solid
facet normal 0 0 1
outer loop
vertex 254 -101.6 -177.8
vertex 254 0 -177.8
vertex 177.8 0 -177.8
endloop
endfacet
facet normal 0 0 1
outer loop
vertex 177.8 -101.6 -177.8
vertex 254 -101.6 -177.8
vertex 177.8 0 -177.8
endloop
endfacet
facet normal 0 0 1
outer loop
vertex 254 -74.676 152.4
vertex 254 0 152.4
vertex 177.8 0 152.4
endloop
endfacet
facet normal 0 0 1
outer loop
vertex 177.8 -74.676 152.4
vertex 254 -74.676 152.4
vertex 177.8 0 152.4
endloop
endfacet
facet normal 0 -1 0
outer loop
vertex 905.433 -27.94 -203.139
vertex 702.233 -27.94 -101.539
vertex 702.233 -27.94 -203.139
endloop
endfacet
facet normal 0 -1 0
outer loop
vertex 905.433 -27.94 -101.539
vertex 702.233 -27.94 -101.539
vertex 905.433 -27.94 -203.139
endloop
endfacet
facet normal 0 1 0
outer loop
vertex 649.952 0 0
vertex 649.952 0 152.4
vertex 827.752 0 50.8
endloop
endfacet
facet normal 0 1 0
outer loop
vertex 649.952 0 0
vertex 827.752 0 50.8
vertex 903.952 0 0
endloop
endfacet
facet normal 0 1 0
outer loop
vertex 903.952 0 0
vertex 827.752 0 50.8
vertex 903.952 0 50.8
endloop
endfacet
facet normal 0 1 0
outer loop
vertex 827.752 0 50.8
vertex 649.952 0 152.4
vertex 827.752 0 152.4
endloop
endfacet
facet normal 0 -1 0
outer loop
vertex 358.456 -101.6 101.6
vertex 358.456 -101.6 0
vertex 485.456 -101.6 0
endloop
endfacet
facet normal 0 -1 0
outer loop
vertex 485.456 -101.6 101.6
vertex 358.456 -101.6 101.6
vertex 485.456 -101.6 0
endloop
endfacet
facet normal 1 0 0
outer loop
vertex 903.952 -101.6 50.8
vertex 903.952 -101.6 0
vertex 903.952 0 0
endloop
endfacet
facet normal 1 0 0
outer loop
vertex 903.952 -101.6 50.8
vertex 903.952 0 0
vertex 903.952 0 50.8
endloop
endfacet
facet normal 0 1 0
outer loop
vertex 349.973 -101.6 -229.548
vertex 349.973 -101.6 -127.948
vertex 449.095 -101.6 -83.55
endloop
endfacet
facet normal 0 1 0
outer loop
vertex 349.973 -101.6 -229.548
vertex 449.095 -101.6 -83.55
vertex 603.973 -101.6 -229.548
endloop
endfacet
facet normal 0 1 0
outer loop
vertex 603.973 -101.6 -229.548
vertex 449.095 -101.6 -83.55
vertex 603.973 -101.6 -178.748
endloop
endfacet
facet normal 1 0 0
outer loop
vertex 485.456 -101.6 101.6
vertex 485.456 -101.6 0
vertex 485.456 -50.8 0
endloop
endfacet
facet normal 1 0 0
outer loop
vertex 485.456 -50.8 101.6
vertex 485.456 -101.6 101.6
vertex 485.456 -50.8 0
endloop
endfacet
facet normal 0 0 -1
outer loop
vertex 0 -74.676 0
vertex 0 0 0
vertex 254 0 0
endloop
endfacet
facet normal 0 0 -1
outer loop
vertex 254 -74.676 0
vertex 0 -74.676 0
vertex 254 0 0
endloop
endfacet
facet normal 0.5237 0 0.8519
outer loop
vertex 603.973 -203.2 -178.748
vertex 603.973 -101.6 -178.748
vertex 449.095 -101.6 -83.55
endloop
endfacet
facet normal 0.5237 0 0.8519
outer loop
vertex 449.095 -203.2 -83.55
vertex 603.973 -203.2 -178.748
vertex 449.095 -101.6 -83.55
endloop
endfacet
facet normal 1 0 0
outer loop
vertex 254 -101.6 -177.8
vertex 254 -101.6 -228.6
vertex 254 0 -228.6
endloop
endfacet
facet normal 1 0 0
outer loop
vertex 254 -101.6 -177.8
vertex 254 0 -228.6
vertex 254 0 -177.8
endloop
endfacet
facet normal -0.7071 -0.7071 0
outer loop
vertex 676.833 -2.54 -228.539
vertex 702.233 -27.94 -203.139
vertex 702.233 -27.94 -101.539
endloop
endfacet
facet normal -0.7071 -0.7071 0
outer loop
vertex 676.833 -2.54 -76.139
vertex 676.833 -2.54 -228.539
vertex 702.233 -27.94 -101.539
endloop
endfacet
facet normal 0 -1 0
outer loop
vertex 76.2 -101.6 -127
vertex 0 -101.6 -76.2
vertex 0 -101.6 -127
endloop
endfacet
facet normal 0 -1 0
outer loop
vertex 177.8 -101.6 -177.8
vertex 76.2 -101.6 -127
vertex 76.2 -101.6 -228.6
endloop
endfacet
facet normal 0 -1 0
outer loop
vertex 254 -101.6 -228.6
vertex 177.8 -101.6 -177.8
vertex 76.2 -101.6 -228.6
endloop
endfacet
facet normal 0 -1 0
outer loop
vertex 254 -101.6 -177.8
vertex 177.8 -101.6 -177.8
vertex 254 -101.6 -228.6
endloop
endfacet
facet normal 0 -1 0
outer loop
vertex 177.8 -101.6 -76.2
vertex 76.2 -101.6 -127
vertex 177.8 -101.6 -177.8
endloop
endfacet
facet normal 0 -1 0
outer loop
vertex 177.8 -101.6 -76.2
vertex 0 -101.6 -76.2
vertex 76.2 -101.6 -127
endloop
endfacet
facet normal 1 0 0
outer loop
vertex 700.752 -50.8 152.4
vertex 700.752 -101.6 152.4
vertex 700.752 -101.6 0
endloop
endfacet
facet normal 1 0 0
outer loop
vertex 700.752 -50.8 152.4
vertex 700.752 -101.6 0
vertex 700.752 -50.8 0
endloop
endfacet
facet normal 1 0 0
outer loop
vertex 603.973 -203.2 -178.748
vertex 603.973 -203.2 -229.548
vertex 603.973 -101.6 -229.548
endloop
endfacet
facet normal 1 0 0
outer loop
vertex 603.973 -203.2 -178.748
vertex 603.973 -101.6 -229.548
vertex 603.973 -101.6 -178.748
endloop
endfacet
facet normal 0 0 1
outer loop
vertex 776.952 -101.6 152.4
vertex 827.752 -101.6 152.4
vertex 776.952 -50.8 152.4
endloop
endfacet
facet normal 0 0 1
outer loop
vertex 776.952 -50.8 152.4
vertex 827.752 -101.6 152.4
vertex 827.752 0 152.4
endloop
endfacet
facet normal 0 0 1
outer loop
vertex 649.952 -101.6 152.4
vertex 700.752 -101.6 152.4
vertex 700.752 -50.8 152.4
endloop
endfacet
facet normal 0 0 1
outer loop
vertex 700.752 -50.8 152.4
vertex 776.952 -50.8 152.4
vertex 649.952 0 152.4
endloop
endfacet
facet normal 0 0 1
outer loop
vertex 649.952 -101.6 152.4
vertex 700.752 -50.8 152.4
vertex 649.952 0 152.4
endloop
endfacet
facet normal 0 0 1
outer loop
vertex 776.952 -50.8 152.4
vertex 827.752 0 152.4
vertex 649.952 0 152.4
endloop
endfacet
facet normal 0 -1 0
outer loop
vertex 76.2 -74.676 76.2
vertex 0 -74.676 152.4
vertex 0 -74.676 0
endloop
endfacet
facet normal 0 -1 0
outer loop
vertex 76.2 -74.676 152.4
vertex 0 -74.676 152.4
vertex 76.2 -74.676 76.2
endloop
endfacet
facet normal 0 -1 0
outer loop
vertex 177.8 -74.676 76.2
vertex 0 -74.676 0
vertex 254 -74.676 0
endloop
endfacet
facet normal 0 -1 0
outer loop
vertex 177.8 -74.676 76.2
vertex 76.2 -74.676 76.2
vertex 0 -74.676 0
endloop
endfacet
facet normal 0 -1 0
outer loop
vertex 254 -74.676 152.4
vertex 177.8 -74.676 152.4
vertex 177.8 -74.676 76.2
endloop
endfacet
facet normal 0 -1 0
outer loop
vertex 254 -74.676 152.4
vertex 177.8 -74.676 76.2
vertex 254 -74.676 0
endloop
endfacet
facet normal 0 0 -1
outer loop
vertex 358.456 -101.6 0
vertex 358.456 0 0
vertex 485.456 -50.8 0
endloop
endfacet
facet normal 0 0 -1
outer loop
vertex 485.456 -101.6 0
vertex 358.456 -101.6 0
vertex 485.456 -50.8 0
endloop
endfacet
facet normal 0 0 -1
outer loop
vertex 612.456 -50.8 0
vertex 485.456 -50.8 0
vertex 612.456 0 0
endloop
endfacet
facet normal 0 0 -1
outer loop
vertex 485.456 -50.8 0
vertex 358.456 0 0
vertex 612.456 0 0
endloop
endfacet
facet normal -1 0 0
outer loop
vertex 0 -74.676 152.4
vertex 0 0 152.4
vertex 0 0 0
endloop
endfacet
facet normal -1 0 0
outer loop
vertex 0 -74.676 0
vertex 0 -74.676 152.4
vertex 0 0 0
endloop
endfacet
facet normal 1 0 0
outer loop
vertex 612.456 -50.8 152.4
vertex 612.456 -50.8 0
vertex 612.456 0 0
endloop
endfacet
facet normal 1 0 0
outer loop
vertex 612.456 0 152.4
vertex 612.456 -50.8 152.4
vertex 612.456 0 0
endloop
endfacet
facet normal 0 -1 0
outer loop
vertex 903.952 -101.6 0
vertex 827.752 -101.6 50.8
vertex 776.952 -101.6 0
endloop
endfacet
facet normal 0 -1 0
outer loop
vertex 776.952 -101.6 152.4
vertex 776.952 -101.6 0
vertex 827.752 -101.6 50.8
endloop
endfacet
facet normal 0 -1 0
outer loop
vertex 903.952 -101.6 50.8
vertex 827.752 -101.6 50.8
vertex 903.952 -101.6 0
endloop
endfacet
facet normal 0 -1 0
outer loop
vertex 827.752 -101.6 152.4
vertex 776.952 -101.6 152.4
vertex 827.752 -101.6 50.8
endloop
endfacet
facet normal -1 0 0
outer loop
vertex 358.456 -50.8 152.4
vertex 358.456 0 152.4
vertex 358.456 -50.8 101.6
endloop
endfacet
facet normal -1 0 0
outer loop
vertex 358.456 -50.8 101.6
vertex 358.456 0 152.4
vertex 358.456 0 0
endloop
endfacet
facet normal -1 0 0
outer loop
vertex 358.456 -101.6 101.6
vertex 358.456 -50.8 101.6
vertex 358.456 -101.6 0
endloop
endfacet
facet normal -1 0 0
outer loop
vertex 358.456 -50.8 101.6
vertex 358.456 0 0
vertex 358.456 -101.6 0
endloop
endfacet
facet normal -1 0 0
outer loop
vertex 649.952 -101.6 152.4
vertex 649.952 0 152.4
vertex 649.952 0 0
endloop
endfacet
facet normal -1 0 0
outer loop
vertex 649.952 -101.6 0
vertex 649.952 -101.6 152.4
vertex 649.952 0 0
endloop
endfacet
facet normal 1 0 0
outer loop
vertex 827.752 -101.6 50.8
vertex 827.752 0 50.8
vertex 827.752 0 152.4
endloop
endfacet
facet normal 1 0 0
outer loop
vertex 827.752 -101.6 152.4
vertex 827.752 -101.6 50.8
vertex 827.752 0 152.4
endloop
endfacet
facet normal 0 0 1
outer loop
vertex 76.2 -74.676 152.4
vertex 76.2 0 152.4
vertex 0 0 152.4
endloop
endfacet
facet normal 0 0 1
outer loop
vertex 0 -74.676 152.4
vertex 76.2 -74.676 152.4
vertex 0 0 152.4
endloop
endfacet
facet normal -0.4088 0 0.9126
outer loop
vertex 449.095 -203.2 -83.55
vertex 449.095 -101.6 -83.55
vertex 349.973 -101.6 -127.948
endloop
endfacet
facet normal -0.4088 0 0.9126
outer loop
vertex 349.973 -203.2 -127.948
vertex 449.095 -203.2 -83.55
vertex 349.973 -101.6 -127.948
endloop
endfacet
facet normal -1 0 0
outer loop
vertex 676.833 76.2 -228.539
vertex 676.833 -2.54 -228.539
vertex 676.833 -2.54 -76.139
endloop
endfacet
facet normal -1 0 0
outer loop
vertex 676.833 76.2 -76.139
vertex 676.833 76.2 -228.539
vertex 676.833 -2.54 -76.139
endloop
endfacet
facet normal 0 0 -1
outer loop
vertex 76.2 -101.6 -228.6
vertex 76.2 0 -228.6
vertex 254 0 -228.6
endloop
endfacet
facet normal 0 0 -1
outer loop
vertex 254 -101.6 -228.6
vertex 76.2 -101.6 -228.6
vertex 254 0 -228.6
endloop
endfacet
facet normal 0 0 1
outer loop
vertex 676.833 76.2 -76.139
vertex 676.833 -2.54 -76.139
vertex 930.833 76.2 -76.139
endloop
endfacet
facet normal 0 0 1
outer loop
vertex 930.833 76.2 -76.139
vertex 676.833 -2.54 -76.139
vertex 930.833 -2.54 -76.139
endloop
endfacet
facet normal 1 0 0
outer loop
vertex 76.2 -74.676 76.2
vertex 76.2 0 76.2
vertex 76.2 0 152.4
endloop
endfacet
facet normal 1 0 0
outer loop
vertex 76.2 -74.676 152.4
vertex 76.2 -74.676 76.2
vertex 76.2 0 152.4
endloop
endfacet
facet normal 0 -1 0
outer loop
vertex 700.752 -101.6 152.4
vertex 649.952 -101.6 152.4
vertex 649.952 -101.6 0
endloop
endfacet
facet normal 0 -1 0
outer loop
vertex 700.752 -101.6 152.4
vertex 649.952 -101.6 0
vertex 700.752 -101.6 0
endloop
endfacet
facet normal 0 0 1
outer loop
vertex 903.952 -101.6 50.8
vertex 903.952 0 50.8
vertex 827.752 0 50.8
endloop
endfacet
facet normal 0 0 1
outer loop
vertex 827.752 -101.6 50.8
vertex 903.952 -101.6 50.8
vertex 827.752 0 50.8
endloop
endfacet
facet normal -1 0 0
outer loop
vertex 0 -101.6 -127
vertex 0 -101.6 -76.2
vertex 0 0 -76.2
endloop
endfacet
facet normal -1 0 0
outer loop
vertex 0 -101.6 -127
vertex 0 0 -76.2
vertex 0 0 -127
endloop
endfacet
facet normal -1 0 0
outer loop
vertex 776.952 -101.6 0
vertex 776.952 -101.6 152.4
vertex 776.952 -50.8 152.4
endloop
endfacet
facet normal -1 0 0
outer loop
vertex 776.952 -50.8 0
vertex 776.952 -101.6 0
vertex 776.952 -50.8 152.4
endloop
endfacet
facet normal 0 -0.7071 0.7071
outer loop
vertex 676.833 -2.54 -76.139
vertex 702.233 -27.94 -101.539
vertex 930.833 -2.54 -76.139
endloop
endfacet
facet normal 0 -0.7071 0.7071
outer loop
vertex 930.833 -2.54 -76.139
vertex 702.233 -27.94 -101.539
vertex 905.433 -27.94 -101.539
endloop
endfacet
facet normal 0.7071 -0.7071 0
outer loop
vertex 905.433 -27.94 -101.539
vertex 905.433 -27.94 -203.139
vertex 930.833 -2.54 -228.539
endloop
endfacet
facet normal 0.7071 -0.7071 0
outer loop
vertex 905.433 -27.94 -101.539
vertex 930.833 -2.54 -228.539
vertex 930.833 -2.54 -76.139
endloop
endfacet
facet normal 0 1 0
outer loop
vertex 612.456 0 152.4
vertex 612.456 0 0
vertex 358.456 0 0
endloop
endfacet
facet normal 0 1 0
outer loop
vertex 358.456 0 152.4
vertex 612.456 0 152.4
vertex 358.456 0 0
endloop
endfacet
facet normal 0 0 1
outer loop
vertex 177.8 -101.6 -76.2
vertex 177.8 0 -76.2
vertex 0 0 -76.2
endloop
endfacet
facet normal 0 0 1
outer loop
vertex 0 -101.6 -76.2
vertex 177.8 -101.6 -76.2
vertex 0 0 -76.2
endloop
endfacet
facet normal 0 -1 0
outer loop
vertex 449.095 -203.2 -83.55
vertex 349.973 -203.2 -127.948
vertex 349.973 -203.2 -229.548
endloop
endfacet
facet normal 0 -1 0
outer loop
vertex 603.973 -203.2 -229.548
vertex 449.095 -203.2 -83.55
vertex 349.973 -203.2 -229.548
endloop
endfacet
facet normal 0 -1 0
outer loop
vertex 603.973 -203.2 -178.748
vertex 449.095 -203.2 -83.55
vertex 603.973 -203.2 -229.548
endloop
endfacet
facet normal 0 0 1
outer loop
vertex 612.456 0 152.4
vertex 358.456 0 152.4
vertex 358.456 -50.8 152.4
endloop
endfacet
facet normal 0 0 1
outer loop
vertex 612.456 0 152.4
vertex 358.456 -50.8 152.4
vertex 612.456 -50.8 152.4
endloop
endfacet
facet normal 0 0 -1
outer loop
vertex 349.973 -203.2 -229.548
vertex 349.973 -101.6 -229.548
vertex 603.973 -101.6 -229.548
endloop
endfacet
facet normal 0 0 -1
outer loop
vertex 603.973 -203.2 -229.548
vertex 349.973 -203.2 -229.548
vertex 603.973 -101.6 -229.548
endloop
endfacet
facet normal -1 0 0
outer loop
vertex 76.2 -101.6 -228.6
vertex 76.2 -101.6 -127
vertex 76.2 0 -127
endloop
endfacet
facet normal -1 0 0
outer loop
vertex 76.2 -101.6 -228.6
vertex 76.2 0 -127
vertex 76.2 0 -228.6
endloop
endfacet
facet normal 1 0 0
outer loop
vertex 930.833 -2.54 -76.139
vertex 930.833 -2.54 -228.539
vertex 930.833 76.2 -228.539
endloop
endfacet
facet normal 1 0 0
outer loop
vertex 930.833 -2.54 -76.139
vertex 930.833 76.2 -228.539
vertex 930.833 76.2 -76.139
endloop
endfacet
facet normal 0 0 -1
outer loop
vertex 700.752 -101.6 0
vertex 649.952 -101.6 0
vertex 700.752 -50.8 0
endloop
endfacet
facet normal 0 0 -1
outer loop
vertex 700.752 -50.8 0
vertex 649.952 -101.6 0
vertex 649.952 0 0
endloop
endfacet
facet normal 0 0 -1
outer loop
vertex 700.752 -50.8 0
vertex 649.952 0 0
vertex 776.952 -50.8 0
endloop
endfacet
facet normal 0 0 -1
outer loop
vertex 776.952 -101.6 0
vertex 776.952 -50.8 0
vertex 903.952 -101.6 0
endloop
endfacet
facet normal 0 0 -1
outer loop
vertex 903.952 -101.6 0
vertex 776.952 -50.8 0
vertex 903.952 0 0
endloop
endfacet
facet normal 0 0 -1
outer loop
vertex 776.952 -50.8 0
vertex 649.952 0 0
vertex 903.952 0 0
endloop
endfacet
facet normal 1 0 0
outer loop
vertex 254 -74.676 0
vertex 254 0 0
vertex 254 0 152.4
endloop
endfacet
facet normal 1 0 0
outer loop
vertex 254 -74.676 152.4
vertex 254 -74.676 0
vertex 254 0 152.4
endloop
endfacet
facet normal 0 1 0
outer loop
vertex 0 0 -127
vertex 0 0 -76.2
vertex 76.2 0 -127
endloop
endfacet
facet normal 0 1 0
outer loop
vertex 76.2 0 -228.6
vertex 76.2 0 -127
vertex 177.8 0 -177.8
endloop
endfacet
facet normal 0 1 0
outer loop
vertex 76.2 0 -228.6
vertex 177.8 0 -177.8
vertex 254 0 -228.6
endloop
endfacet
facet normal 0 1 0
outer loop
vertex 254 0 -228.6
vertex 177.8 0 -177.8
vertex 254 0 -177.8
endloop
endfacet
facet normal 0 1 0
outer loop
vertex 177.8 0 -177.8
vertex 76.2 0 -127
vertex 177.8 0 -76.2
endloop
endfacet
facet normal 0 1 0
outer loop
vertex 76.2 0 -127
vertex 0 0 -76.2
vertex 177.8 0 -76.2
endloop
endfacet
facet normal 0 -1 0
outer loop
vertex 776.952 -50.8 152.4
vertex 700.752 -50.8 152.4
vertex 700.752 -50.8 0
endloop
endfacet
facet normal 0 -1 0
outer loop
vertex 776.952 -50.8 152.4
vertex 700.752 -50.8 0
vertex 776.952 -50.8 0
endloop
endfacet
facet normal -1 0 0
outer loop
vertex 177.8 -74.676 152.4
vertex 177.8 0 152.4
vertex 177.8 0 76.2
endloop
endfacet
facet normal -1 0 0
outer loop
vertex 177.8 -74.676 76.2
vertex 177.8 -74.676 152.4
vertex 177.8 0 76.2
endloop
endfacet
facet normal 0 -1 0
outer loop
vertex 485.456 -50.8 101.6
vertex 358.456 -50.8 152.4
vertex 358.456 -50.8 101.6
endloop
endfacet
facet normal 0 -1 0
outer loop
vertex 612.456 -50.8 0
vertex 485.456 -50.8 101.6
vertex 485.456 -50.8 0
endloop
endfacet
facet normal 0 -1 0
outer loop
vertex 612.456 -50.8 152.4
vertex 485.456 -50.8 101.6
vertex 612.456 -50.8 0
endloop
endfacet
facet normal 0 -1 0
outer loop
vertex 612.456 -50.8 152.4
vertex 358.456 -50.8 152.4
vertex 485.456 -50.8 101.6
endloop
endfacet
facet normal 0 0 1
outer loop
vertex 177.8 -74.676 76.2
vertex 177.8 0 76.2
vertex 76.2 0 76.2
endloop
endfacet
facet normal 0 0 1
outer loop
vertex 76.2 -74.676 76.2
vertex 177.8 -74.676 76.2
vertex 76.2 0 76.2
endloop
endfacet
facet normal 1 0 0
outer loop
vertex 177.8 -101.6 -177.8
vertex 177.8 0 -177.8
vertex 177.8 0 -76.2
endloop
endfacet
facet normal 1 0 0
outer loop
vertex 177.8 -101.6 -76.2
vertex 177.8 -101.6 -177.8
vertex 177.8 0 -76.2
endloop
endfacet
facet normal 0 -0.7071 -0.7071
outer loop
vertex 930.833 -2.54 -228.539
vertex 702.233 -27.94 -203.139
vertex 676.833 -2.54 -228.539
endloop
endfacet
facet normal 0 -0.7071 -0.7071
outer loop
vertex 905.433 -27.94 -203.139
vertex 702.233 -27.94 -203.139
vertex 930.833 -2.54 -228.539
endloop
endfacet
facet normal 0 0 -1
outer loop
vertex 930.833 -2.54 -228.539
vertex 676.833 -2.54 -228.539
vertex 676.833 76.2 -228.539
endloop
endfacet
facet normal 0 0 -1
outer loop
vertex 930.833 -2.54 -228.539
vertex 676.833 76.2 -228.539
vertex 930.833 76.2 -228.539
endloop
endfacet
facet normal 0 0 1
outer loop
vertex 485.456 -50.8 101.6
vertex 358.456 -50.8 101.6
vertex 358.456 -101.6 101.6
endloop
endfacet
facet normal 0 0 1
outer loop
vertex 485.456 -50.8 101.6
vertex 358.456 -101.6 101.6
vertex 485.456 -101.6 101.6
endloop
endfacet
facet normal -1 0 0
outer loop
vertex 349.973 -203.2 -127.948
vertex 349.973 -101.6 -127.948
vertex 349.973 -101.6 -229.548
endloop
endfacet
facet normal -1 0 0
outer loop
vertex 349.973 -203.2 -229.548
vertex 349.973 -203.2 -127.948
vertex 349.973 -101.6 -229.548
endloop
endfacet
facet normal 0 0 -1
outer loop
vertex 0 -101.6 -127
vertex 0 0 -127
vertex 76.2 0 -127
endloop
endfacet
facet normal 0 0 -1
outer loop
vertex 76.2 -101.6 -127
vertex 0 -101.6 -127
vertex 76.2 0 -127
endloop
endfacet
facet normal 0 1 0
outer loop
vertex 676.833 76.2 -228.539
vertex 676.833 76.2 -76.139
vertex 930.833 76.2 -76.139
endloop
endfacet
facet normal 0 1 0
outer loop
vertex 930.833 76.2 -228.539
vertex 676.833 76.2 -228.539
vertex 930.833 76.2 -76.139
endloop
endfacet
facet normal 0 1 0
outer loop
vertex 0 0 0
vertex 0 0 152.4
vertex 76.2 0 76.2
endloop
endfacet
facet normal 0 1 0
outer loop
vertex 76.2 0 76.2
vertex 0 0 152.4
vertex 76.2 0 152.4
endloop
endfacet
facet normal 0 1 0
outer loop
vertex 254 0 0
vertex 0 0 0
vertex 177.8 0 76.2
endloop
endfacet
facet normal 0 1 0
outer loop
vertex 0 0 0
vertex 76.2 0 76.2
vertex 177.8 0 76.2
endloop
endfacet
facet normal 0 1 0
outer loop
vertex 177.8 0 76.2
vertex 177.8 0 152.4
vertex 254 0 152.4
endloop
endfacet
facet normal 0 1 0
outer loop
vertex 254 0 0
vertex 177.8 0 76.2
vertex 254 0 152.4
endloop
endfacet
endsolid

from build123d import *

# Parameters (mm, degrees)
F1_DEPTH  = 74.676
F4_DEPTH  = 101.6
F5_W      = 76.2
F5_H      = 50.8
F6_DEPTH  = 152.4
F7_DEPTH  = 152.4
F8_W      = 127
F8_H      = 50.8
F9_DEPTH  = 50.8
F10_W     = 254
F10_H     = 101.6
F11_DEPTH = 152.4
F12_W     = 76.2
F12_H     = 101.6
F13_DEPTH = 101.6
F14_W     = 76.2
F14_H     = 101.6
F15_DEPTH = 101.6
F18_DEPTH = 101.6
F20_DEPTH = 101.6
F21_W     = 254
F21_H     = 152.4
F22_DEPTH = 27.94
F23_SIZE  = 25.4
F24_DEPTH = 76.2


with BuildPart() as f1:
    # F0 (on Front) → F1 (new body)
    with BuildSketch(Plane.XZ):
        Polygon((0, 152.4), (0, 0), (254, 0), (254, 152.4), (177.8, 152.4), (177.8, 76.2), (76.2, 76.2), (76.2, 152.4), align=None)
    extrude(amount=F1_DEPTH)


with BuildPart() as f4:
    # F3 (on Front) → F4 (new body)
    with BuildSketch(Plane.XZ):
        Polygon((649.95204, 152.4), (649.95204, 0), (903.95204, 0), (903.95204, 50.8), (827.75204, 50.8), (827.75204, 152.4), align=None)
    extrude(amount=F4_DEPTH)

    # F5 (on face) → F6 (cut)
    with BuildSketch(Plane.XY.offset(152.4)):
        with Locations((738.85204, -76.2)):
            Rectangle(F5_W, F5_H)
    extrude(amount=-F6_DEPTH, mode=Mode.SUBTRACT)


with BuildPart() as f7:
    # F2 (on Top) → F7 (new body)
    with BuildSketch(Plane.XY):
        Polygon((358.455741, 0), (358.455741, -101.6), (485.455741, -101.6), (485.455741, -50.8), (612.455741, -50.8), (612.455741, 0), align=None)
    extrude(amount=F7_DEPTH)

    # F8 (on face) → F9 (cut)
    with BuildSketch(Plane.XY.offset(152.4)):
        with Locations((421.955741, -76.2)):
            Rectangle(F8_W, F8_H)
    extrude(amount=-F9_DEPTH, mode=Mode.SUBTRACT)


with BuildPart() as f11:
    # F10 (on Top) → F11 (new body)
    with BuildSketch(Plane.XY):
        with Locations((127, -254)):
            Rectangle(F10_W, F10_H)
    extrude(amount=F11_DEPTH)

    # F12 (on face) → F13 (cut)
    with BuildSketch(Plane.XZ.offset(304.8)):
        with Locations((38.1, 50.8)):
            Rectangle(F12_W, F12_H)
    extrude(amount=-F13_DEPTH, mode=Mode.SUBTRACT)

    # F14 (on face) → F15 (cut)
    with BuildSketch(Plane.XZ.offset(304.8)):
        with Locations((215.9, 101.6)):
            Rectangle(F14_W, F14_H)
    extrude(amount=-F15_DEPTH, mode=Mode.SUBTRACT)


with BuildPart() as f18:
    # F17 (on Front) → F18 (new body)
    with BuildSketch(Plane.XZ):
        Polygon((177.8, -76.2), (0, -76.2), (0, -127), (76.2, -127), (76.2, -228.6), (254, -228.6), (254, -177.8), (177.8, -177.8), align=None)
    extrude(amount=F18_DEPTH)


with BuildPart() as f20:
    # F19 (on face) → F20 (new body)
    with BuildSketch(Plane.XZ.offset(101.6)):
        Polygon((349.973459, -127.947941), (349.973459, -229.547941), (603.973459, -229.547941), (603.973459, -178.747941), (449.09542, -83.549562), align=None)
    extrude(amount=F20_DEPTH)


with BuildPart() as f22:
    # F21 (on Front) → F22 (new body)
    with BuildSketch(Plane.XZ):
        with Locations((803.832799, -152.338558)):
            Rectangle(F21_W, F21_H)
    extrude(amount=F22_DEPTH)

    # F23
    f23_edges = [f22.edges().sort_by_distance(p)[0] for p in [
        (676.832799, -27.94, -152.338558),
        (803.832799, -27.94, -228.538558),
        (930.832799, -27.94, -152.338558),
        (803.832799, -27.94, -76.138558),
    ]]
    chamfer(f23_edges, length=F23_SIZE)

    # F21 (on Front) → F24 (join)
    with BuildSketch(Plane.XZ):
        with Locations((803.832799, -152.338558)):
            Rectangle(F21_W, F21_H)
    extrude(amount=-F24_DEPTH)


solid = Compound([f1.part, f4.part, f7.part, f18.part, f20.part, f22.part])
